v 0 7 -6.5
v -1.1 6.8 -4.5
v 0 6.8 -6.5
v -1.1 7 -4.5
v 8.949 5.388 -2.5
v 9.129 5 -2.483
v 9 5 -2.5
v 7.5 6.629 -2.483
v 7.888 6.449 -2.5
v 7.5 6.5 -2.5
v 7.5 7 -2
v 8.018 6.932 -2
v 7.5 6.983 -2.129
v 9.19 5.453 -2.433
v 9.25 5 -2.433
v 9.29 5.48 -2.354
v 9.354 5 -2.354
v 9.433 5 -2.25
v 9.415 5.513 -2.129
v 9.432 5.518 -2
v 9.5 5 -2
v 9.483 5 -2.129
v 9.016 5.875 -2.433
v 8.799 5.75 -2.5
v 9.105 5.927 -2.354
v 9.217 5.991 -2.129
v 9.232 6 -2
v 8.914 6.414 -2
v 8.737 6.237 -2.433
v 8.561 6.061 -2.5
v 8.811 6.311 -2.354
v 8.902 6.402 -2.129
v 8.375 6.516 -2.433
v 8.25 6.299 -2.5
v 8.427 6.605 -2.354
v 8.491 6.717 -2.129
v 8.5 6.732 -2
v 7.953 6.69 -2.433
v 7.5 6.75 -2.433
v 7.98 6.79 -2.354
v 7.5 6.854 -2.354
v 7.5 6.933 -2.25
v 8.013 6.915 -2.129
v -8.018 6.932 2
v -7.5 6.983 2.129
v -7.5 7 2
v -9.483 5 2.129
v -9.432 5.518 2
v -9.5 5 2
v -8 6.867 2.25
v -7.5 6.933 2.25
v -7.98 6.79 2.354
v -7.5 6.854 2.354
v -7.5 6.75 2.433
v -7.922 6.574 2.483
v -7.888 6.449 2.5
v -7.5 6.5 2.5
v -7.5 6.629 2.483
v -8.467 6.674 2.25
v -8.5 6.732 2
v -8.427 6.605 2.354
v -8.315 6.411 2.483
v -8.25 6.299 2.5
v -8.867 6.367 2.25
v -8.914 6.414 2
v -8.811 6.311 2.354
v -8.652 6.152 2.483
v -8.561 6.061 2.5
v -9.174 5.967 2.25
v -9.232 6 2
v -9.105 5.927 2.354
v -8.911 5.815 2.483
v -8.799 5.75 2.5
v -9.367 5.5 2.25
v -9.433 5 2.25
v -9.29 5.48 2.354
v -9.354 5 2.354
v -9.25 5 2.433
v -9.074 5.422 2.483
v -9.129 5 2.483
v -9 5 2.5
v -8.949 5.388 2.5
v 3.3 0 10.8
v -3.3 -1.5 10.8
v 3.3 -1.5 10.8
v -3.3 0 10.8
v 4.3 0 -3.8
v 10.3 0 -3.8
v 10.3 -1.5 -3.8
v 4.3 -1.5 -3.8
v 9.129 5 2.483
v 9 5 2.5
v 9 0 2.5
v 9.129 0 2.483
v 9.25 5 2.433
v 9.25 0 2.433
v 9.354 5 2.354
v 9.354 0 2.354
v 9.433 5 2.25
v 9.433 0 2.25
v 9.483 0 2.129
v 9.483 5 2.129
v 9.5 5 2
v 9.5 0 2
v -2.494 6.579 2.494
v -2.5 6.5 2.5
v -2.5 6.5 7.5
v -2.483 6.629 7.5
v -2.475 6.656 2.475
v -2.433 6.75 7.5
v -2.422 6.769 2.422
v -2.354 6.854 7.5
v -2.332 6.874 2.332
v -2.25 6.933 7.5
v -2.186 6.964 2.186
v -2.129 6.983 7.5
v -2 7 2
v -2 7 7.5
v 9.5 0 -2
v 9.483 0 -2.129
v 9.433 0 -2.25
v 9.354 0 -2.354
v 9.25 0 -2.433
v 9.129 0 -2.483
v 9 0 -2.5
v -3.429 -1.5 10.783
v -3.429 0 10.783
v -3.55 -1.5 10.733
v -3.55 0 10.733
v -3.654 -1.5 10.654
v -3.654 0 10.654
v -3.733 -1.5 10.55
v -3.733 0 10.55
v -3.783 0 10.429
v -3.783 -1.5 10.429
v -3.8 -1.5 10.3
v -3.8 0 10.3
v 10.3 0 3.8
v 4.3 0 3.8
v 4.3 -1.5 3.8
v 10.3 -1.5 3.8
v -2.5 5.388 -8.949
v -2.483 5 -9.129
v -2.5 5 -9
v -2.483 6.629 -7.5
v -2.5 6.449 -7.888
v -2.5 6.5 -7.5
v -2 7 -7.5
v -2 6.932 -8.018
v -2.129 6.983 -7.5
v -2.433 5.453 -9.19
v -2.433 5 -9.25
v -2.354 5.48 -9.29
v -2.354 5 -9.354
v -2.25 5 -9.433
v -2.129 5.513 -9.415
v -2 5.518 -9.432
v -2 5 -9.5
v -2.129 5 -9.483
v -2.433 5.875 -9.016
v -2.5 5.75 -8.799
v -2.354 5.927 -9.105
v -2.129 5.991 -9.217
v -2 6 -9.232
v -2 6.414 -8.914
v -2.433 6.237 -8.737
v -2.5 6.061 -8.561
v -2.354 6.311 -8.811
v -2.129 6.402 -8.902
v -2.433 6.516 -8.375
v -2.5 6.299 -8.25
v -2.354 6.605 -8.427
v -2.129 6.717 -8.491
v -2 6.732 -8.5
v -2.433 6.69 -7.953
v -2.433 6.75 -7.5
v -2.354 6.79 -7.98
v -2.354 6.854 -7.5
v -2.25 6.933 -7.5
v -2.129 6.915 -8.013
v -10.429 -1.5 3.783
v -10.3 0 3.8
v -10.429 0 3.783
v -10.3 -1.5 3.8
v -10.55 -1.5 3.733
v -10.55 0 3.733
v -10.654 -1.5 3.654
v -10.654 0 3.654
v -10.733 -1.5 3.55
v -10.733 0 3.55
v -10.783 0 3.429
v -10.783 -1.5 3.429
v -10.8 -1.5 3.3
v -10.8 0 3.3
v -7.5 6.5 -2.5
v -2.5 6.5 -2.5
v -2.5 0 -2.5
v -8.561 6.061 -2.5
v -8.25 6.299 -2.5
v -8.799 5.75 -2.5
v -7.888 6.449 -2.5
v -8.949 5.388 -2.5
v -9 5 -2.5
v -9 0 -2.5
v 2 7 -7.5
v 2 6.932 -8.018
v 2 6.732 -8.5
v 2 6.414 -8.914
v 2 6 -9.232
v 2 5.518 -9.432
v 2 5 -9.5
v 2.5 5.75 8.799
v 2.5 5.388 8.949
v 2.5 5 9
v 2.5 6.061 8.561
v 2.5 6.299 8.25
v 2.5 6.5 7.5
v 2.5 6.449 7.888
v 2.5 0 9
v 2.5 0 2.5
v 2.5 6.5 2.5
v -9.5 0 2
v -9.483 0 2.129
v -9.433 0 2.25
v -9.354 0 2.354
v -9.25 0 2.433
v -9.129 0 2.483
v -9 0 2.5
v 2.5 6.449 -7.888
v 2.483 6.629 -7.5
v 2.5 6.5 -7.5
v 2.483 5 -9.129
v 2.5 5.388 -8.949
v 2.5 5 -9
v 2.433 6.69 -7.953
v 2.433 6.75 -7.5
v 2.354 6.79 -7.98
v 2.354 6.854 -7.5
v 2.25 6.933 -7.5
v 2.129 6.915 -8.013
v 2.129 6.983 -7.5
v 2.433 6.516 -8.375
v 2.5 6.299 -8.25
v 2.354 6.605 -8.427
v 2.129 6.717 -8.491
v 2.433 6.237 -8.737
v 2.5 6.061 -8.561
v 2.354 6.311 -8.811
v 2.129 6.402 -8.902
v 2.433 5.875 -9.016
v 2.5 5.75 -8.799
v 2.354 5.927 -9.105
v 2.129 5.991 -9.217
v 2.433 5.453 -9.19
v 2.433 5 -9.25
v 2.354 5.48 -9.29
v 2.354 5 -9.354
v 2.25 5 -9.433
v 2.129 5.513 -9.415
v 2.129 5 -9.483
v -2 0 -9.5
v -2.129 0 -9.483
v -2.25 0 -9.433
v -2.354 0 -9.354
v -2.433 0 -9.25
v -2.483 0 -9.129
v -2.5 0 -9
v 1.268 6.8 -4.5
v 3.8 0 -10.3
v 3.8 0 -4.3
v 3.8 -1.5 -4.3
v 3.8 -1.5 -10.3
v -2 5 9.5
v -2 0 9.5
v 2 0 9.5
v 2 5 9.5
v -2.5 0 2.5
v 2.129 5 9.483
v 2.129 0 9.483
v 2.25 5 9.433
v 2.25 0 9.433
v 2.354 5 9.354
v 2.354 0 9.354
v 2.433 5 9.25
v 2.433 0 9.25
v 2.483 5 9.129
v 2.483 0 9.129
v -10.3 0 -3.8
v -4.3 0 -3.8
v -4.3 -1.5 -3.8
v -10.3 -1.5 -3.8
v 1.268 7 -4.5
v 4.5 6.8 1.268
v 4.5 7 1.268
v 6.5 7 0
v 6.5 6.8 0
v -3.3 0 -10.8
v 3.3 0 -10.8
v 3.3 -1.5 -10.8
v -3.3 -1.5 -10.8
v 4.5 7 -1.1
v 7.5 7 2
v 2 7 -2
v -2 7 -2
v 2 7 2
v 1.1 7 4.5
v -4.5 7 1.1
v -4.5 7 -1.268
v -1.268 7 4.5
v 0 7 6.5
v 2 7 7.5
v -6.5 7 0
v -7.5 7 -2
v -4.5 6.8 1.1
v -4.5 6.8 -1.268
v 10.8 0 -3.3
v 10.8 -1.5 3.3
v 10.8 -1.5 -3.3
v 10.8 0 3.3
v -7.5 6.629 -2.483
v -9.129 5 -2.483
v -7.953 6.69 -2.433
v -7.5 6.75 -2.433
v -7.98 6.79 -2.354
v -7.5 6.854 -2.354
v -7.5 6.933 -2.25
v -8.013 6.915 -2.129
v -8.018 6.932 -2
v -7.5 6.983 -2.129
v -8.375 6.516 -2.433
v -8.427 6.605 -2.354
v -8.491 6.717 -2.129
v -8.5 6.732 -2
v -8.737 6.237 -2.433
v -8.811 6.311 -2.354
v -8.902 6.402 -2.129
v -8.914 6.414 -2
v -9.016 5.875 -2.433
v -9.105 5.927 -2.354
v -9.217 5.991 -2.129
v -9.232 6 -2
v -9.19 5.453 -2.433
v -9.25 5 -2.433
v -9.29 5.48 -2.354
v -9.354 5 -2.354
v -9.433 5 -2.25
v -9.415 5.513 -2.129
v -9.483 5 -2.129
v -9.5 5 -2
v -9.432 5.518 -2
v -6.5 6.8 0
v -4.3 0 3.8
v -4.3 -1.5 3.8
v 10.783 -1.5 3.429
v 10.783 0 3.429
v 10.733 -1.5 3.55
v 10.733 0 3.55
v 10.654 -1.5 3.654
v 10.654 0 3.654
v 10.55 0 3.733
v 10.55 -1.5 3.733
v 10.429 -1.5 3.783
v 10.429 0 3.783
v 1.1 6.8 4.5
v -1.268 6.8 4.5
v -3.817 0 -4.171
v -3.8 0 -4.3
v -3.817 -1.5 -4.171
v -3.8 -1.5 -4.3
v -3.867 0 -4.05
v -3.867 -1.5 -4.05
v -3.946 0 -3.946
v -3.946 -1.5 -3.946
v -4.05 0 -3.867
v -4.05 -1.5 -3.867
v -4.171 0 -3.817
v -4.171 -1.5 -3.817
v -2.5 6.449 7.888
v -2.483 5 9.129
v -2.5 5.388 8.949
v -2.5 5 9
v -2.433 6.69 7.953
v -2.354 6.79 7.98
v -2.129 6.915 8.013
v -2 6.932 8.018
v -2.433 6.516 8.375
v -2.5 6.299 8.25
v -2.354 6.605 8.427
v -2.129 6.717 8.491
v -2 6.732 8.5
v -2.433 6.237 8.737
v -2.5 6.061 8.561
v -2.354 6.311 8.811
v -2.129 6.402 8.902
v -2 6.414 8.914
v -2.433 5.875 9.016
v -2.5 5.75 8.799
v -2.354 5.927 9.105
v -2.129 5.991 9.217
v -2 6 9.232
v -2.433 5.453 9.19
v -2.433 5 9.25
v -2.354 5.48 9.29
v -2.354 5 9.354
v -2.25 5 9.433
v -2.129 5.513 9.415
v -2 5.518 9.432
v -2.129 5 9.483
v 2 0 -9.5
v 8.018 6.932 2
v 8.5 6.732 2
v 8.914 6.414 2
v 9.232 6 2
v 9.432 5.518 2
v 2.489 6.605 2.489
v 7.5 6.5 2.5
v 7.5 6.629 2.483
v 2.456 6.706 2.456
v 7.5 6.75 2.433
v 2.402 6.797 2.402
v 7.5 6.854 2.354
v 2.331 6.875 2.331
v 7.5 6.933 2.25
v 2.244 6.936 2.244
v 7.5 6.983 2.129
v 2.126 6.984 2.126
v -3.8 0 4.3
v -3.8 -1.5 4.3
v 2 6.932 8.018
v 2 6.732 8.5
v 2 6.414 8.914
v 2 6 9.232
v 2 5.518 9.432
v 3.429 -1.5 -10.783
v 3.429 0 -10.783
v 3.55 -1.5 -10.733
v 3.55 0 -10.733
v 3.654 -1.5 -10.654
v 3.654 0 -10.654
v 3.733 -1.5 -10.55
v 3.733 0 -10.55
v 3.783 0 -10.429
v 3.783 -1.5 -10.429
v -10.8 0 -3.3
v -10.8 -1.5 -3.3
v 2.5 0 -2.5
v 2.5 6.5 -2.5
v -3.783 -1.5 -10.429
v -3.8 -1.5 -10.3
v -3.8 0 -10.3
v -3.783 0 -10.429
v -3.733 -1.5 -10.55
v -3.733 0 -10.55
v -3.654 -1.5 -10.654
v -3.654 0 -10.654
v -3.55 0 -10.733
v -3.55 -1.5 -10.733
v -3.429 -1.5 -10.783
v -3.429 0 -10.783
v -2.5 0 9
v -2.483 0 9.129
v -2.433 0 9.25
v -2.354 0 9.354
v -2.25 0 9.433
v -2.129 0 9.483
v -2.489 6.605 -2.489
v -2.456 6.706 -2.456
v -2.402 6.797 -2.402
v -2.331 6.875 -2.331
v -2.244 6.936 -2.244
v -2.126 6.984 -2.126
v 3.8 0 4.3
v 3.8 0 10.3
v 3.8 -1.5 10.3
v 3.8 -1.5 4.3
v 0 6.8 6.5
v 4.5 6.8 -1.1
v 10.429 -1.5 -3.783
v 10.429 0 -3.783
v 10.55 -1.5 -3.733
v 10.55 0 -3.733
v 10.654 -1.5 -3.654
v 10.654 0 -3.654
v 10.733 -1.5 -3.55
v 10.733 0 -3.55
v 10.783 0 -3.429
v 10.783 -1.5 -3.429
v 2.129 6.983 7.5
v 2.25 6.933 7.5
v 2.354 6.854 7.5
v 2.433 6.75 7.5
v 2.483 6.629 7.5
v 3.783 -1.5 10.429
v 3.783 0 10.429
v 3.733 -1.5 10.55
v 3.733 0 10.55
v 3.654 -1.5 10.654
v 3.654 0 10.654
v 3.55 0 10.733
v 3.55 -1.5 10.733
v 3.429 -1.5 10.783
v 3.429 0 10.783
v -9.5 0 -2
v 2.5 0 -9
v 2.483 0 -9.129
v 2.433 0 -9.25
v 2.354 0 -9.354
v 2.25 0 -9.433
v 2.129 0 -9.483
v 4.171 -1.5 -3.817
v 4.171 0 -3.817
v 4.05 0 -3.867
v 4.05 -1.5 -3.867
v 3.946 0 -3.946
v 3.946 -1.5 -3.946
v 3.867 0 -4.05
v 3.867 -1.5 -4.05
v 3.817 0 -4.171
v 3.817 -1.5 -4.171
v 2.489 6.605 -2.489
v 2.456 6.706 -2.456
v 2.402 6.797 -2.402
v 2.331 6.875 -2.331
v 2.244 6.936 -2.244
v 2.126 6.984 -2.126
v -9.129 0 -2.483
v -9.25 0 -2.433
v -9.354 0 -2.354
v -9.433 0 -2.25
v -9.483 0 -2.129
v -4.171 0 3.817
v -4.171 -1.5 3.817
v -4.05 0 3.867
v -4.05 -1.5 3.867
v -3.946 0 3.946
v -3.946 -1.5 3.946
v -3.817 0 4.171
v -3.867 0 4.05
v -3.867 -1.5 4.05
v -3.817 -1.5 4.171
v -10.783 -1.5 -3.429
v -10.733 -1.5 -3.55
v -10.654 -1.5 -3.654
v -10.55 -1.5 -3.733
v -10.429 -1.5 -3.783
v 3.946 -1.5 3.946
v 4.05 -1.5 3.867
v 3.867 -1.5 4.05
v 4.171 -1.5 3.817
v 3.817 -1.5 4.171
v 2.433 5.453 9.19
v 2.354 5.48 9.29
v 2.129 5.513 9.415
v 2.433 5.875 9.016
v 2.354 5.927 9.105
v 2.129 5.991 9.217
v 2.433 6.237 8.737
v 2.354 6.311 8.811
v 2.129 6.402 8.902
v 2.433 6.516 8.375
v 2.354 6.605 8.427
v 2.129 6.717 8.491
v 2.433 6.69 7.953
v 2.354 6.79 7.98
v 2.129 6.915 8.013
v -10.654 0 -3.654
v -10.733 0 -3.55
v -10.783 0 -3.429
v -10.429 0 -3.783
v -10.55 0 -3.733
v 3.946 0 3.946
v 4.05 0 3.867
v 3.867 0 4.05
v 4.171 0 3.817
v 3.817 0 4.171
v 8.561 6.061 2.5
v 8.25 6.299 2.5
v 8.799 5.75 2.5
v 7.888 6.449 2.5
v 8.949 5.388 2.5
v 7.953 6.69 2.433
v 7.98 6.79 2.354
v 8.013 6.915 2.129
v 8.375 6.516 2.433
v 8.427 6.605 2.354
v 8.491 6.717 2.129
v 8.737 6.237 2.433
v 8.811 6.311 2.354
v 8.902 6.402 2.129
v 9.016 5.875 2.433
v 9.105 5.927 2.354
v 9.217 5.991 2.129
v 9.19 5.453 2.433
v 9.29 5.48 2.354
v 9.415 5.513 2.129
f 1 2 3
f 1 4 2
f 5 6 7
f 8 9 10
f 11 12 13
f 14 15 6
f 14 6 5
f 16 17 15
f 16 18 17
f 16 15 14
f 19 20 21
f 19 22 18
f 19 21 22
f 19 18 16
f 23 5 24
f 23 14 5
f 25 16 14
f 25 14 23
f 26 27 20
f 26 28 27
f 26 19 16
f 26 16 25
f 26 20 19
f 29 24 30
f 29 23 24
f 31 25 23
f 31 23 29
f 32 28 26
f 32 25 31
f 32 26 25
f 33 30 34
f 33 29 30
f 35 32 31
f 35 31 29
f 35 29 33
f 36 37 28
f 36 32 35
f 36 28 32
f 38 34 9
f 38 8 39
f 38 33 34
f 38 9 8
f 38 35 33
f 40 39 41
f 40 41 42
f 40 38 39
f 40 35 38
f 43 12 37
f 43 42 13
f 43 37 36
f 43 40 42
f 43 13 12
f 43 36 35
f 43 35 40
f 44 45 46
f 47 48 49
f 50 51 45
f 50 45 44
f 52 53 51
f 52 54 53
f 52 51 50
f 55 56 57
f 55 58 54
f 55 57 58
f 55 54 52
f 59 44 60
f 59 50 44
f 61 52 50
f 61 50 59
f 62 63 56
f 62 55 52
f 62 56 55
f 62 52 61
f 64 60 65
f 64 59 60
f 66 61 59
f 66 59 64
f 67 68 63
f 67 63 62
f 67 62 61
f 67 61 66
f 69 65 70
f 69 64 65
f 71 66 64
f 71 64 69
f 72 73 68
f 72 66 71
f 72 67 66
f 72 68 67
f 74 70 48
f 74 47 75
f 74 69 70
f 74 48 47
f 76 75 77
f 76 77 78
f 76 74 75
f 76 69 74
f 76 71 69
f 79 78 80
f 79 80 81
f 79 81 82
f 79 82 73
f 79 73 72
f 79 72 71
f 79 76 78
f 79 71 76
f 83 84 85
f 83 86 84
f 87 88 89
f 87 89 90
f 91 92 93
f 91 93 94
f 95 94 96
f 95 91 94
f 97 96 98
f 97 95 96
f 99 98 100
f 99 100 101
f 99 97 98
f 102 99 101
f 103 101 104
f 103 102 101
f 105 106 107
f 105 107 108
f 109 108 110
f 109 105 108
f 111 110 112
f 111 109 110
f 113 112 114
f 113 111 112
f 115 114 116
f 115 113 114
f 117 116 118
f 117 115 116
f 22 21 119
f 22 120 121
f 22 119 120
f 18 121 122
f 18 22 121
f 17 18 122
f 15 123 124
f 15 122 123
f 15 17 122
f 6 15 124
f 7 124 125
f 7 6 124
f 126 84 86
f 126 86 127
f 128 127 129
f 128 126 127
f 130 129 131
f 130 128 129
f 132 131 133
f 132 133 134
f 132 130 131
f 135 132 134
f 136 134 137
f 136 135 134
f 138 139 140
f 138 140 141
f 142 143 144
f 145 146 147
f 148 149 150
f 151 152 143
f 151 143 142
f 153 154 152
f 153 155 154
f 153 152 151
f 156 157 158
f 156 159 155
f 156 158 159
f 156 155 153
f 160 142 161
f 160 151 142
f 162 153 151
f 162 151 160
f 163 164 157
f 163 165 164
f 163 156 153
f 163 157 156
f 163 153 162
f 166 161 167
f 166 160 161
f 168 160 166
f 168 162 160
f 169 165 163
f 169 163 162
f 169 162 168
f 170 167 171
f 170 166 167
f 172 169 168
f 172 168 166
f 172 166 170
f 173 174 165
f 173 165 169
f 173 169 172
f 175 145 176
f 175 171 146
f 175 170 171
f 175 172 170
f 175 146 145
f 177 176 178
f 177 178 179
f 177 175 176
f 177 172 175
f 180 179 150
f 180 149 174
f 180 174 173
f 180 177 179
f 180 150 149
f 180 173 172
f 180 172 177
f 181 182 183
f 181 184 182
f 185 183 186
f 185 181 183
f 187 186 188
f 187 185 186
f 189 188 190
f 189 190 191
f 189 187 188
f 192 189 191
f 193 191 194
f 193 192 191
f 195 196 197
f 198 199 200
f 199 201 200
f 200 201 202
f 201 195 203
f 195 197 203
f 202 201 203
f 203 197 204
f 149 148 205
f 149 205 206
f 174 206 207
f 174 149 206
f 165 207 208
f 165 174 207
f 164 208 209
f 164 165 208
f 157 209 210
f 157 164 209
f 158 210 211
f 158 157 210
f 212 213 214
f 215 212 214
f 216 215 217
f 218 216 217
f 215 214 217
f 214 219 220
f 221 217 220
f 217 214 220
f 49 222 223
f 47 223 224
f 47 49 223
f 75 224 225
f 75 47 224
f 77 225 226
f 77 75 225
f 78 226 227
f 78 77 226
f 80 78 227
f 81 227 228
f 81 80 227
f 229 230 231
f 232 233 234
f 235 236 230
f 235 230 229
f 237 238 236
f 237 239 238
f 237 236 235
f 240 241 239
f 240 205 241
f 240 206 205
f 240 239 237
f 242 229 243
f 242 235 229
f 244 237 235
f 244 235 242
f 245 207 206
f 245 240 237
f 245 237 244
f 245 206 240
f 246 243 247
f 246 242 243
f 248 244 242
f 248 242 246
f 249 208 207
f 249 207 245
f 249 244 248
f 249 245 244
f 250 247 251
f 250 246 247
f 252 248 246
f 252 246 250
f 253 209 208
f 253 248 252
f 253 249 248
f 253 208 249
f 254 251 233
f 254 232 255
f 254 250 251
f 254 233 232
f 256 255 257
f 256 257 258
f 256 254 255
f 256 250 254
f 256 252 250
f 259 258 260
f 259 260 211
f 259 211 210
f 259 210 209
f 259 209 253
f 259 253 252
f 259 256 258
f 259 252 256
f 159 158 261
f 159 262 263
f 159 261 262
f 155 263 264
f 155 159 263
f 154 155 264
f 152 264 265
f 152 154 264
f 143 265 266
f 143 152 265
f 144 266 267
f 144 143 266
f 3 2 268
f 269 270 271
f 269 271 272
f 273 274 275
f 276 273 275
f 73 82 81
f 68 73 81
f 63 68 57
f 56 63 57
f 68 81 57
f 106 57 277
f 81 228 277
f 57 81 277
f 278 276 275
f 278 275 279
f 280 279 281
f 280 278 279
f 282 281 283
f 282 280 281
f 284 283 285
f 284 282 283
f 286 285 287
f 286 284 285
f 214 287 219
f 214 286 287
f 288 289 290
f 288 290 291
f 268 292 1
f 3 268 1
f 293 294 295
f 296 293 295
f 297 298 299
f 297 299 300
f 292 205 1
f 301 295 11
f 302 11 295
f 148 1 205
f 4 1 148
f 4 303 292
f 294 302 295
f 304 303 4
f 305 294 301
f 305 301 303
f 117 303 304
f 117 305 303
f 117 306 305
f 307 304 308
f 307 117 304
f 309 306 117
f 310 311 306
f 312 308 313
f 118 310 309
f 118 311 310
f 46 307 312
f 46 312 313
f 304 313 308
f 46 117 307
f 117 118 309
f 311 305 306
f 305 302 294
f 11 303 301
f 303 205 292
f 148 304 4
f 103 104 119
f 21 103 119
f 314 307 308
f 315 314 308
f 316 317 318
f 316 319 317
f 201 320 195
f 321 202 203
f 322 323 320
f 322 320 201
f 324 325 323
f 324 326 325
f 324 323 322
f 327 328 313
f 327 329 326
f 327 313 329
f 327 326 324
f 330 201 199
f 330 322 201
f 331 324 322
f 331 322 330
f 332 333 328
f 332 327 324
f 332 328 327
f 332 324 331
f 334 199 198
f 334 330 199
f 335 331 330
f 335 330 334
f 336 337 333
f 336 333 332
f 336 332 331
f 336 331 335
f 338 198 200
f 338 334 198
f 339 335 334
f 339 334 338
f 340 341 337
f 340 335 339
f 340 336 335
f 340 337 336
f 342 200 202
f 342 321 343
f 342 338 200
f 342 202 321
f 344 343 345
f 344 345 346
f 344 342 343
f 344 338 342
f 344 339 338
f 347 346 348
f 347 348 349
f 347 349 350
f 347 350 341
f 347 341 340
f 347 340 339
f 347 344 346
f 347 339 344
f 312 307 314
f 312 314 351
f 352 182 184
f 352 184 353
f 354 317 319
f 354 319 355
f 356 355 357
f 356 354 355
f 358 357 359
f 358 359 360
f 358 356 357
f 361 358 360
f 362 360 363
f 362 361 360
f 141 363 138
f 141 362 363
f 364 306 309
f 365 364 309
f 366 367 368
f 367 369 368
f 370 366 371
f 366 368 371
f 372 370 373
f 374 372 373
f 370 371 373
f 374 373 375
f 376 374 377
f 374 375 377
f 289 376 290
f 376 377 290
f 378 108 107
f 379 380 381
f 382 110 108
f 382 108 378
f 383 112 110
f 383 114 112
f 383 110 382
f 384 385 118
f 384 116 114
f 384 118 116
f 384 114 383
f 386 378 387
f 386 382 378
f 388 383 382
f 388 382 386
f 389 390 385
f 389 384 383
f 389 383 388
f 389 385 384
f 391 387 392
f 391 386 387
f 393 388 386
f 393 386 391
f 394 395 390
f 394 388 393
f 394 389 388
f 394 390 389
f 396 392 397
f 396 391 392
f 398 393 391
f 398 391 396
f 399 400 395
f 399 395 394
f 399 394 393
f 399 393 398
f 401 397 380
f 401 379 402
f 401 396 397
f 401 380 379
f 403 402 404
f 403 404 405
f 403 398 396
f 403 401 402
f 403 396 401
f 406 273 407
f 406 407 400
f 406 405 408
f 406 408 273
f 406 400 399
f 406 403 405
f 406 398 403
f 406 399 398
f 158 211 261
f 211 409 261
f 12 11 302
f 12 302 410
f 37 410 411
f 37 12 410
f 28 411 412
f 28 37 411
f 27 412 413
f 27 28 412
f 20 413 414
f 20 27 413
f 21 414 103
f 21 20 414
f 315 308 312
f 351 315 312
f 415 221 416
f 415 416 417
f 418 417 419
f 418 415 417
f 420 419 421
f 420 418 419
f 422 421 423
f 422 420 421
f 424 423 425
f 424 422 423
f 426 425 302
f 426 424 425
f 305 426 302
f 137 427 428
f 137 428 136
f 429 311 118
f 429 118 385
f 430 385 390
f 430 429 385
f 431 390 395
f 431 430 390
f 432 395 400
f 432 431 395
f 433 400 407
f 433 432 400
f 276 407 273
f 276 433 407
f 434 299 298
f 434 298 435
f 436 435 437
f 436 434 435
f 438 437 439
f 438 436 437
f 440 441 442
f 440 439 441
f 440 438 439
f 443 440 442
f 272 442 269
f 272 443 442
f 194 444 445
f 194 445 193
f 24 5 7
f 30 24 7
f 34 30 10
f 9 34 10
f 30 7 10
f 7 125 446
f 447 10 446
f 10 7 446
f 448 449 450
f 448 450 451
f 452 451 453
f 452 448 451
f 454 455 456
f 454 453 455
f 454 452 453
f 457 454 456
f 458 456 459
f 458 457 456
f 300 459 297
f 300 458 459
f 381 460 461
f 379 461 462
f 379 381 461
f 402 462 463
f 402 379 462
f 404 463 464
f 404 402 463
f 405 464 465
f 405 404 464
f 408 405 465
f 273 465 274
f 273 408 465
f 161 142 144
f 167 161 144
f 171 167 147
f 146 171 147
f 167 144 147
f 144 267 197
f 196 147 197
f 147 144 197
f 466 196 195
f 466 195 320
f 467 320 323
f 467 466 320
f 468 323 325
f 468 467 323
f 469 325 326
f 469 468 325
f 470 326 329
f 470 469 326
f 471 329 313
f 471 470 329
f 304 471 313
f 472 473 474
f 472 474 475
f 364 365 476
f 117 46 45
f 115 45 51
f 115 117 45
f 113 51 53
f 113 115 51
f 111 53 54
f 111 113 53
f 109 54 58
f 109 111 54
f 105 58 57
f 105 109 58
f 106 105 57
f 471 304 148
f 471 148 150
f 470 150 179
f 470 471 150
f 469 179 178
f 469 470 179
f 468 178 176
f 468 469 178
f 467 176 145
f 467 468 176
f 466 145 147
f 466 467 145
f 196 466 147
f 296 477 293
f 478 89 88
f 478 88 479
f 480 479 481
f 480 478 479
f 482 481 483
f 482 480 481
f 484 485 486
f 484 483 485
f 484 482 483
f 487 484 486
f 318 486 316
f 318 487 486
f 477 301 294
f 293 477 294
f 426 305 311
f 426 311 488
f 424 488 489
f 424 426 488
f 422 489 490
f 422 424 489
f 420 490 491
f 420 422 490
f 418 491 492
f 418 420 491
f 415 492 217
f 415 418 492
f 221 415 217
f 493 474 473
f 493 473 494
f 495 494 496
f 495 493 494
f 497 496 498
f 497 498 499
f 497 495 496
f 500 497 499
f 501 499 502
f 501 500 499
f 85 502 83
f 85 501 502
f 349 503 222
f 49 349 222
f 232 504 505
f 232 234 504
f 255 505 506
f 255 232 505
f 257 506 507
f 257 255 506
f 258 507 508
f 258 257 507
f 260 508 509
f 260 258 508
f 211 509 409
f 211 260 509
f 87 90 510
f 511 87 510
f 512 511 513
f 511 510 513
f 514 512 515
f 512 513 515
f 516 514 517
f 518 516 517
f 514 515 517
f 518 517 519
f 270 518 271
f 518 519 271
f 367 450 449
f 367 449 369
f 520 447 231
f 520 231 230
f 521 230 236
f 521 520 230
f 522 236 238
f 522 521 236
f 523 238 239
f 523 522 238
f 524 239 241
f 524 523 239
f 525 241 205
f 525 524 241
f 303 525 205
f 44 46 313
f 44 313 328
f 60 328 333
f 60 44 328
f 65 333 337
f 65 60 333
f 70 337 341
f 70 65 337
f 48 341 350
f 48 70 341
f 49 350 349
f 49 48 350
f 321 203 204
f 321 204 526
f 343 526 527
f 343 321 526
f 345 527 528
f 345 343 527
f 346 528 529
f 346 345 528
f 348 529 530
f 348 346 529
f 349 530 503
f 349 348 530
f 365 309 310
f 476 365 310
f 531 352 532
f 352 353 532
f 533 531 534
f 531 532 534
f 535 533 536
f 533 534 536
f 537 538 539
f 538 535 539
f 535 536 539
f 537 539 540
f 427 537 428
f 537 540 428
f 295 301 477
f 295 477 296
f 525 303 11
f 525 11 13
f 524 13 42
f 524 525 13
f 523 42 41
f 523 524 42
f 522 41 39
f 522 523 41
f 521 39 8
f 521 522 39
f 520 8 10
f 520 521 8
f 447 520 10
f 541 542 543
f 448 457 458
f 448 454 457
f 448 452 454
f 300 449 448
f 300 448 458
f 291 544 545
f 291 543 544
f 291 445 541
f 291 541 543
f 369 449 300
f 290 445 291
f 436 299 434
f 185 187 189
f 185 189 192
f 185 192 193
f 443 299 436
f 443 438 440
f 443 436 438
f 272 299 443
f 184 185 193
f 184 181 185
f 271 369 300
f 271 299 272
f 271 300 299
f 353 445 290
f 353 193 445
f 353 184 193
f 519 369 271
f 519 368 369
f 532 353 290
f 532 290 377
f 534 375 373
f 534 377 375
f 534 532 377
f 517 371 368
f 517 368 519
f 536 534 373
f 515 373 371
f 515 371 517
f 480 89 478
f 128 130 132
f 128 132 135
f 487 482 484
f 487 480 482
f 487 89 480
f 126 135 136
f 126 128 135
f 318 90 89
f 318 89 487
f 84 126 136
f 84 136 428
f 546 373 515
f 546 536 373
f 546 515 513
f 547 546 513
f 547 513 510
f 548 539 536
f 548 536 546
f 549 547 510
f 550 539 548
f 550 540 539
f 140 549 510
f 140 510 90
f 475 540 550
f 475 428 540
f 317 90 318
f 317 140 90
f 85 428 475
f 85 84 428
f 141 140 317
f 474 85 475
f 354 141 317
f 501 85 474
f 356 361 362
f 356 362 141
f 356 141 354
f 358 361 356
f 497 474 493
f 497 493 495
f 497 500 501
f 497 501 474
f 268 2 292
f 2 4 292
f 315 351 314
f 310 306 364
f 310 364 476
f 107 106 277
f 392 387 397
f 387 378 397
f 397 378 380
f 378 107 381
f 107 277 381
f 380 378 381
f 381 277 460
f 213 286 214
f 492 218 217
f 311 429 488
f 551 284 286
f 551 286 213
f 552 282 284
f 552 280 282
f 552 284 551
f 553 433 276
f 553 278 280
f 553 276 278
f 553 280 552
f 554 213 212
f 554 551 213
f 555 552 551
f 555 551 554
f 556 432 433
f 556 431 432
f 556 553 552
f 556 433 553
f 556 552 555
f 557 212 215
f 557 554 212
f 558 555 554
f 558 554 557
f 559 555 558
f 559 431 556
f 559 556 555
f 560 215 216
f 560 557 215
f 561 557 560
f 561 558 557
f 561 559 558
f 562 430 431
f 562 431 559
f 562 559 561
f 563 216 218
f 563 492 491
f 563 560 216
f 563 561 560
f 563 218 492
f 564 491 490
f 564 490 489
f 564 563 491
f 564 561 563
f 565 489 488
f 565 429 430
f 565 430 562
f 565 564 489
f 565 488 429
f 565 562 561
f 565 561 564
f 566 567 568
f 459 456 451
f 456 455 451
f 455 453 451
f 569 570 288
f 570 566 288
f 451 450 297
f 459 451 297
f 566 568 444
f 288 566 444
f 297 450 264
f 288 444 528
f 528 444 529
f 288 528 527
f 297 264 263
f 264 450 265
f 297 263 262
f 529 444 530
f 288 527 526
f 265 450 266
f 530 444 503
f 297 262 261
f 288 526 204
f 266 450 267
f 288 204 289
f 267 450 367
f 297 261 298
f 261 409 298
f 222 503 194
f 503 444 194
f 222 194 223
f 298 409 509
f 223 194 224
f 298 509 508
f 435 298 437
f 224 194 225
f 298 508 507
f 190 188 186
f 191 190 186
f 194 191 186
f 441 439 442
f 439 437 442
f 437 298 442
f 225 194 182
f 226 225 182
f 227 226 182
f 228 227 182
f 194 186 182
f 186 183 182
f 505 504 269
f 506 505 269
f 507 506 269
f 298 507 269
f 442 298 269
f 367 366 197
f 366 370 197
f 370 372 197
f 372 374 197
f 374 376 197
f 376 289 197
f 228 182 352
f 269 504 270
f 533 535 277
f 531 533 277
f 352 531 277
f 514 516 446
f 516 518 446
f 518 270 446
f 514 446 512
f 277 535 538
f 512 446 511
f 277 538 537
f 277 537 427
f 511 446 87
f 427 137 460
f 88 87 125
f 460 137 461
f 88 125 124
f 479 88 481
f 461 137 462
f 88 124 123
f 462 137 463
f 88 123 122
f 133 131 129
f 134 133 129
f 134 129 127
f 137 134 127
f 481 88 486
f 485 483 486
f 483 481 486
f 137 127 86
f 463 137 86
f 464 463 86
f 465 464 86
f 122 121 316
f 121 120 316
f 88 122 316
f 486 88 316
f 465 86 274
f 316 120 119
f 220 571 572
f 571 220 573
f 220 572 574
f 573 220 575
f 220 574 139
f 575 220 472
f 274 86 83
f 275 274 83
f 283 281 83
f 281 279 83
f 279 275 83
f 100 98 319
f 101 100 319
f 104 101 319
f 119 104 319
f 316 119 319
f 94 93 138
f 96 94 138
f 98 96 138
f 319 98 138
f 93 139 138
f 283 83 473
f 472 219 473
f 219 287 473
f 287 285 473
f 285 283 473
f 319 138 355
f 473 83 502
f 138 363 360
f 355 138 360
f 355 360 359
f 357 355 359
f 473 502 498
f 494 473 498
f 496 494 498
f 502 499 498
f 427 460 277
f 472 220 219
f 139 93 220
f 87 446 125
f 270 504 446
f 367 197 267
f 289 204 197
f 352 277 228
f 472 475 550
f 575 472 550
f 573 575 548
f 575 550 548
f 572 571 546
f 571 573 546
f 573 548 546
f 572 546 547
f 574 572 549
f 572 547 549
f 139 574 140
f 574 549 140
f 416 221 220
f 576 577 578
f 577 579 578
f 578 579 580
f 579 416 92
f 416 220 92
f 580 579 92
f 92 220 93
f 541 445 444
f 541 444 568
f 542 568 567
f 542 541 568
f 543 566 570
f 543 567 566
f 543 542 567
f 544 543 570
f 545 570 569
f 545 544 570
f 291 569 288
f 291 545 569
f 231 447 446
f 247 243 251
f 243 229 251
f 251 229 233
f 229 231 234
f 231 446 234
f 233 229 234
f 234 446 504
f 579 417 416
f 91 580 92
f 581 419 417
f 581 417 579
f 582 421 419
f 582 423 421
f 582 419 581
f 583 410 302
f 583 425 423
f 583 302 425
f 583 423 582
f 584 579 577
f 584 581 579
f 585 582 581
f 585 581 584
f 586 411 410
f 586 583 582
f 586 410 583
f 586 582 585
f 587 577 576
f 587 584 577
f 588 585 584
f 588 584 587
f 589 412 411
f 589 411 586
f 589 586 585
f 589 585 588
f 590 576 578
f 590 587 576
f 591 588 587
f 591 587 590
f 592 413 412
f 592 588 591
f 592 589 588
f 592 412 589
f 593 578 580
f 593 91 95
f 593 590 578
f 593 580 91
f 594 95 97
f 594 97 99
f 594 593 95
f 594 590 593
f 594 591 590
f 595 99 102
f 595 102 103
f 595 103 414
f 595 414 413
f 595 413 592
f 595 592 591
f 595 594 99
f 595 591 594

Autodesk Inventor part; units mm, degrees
ref_plane "YZ Plane" through (0, 0, 0) normal (1, 0, 0) x (0, 1, 0)
ref_plane "XZ Plane" through (0, 0, 0) normal (0, 1, 0) x (-1, 0, 0)
ref_plane "XY Plane" through (0, 0, 0) normal (0, 0, 1) x (1, 0, 0)
sketch "Esquisse1" plane through (0, 0, 0) normal (0, 1, 0) x (-1, 0, 0)
  line L0 (9.5, 2.5) -> (-9.5, 2.5)
  line L1 (-9.5, 2.5) -> (-9.5, -2.5)
  line L2 (-9.5, -2.5) -> (9.5, -2.5)
  line L3 (9.5, -2.5) -> (9.5, 2.5)
  line L4 (2.5, 9.5) -> (-2.5, 9.5)
  line L5 (-2.5, 9.5) -> (-2.5, -9.5)
  line L6 (-2.5, -9.5) -> (2.5, -9.5)
  line L7 (2.5, -9.5) -> (2.5, 9.5)
  point P0 (0, 0)
  dimension "d0" = 19
  dimension "d1" = 19
  dimension "d2" = 5
  dimension "d3" = 5
  dimension "d4" = 7
  dimension "d5" = 7
  dimension "d6" = 2.5
  dimension "d7" = 2.5
extrude "Extrusion1" add sketch "Esquisse1" along normal blind 7
sketch "Esquisse2" plane through (0, 0, 0) normal (0, -1, 0) x (1, 0, 0)
  line L0 (2.5, 9.5) -> (2.5, 2.5) projected
  line L1 (-2.5, 9.5) -> (2.5, 9.5) projected
  line L2 (-2.5, 2.5) -> (-2.5, 9.5) projected
  line L3 (-9.5, 2.5) -> (-2.5, 2.5) projected
  line L4 (-9.5, -2.5) -> (-9.5, 2.5) projected
  line L5 (-2.5, -2.5) -> (-9.5, -2.5) projected
  line L6 (-2.5, -9.5) -> (-2.5, -2.5) projected
  line L7 (2.5, -9.5) -> (-2.5, -9.5) projected
  line L8 (2.5, -2.5) -> (2.5, -9.5) projected
  line L9 (9.5, -2.5) -> (2.5, -2.5) projected
  line L10 (9.5, 2.5) -> (9.5, -2.5) projected
  line L11 (2.5, 2.5) -> (9.5, 2.5) projected
  line L12 (10.8, 3.8) -> (10.8, -3.8)
  line L13 (10.8, -3.8) -> (3.8, -3.8)
  line L14 (3.8, -3.8) -> (3.8, -10.8)
  line L15 (3.8, -10.8) -> (-3.8, -10.8)
  line L16 (-3.8, -10.8) -> (-3.8, -3.8)
  line L17 (-3.8, -3.8) -> (-10.8, -3.8)
  line L18 (-10.8, -3.8) -> (-10.8, 3.8)
  line L19 (-10.8, 3.8) -> (-3.8, 3.8)
  line L20 (-3.8, 3.8) -> (-3.8, 10.8)
  line L21 (-3.8, 10.8) -> (3.8, 10.8)
  line L22 (3.8, 10.8) -> (3.8, 3.8)
  line L23 (3.8, 3.8) -> (10.8, 3.8)
  point P0 (0, 0)
  dimension "d10" = 1.3
extrude "Extrusion2" add sketch "Esquisse2" along normal blind 1.5 contours L0 L11 L10 L9 L8 L7 L6 L5 L4 L3 L2 L1 | L12 L13 L14 L15 L16 L17 L18 L19 L20 L21 L22 L23
fillet "Congé1" radius 2 4 edges at (0, 7, 9.5) (9.5, 7, 0) (0, 7, -9.5) (-9.5, 7, 0)
fillet "Congé2" radius 0.5 24 edges at (2.5, 6.4142, 8.9142) (2.5, 2.5, 9.5) (2.5, 7, 5) (8.9142, 6.4142, 2.5) (9.5, 2.5, 2.5) (5, 7, 2.5) (8.9142, 6.4142, -2.5) (9.5, 2.5, -2.5) (5, 7, -2.5) (2.5, 6.4142, -8.9142) (2.5, 2.5, -9.5) (2.5, 7, -5) (-2.5, 6.4142, -8.9142) (-2.5, 2.5, -9.5) (-2.5, 7, -5) (-8.9142, 6.4142, -2.5) (-9.5, 2.5, -2.5) (-5, 7, -2.5) (-8.9142, 6.4142, 2.5) (-9.5, 2.5, 2.5) (-5, 7, 2.5) (-2.5, 6.4142, 8.9142) (-2.5, 2.5, 9.5) (-2.5, 7, 5)
fillet "Congé3" radius 0.5 12 edges at (10.8, -0.75, -3.8) (10.8, -0.75, 3.8) (3.8, -0.75, -3.8) (3.8, -0.75, -10.8) (-3.8, -0.75, -10.8) (-3.8, -0.75, -3.8) (-10.8, -0.75, -3.8) (-10.8, -0.75, 3.8) (-3.8, -0.75, 3.8) (-3.8, -0.75, 10.8) (3.8, -0.75, 10.8) (3.8, -0.75, 3.8)
sketch "Esquisse3" plane through (0, 7, 0) normal (0, 1, 0) x (1, 0, 0)
  line L0 (1.1, -4.5) -> (-1.2682, -4.5)
  line L1 (-1.2682, -4.5) -> (0, -6.5)
  line L2 (1.1, -4.5) -> (0, -6.5)
  line L3 (2.5, -7.5) -> (2.5, -2.5) projected
  line L4 (-2, -9.5) -> (2, -9.5) projected
  line L5 (-4.5, -1.1) -> (-4.5, 1.2682)
  line L6 (-4.5, 1.2682) -> (-6.5, 0)
  line L7 (-4.5, -1.1) -> (-6.5, 0)
  line L8 (-1.1, 4.5) -> (1.2682, 4.5)
  line L9 (1.2682, 4.5) -> (0, 6.5)
  line L10 (-1.1, 4.5) -> (0, 6.5)
  line L11 (4.5, 1.1) -> (4.5, -1.2682)
  line L12 (4.5, -1.2682) -> (6.5, 0)
  line L13 (4.5, 1.1) -> (6.5, 0)
  point P0 (0, 0)
  point P1 (0, 0)
  point P2 (0, 0)
  point P3 (0, 0)
  dimension "d18" = 1.1
  dimension "d19" = 2.5
  dimension "d20" = 3
  dimension "d21" = 5
  dimension "d24" = 360
extrude "Extrusion3" cut sketch "Esquisse3" against normal blind 0.2
equation "\"d1\" = d0"
equation "\"d3\" = d2"
equation "\"d4\" = -0.5 * d2 + 0.5 * d0"
equation "\"d5\" = d4"
equation "\"d6\" = 0.5 * d3"
equation "\"d7\" = 0.5 * d2"
equation "\"d18\" = 0.5 * d17"
equation "\"d17\" = 2.2"
properties part number "Cross" material "Plastique ABS"
